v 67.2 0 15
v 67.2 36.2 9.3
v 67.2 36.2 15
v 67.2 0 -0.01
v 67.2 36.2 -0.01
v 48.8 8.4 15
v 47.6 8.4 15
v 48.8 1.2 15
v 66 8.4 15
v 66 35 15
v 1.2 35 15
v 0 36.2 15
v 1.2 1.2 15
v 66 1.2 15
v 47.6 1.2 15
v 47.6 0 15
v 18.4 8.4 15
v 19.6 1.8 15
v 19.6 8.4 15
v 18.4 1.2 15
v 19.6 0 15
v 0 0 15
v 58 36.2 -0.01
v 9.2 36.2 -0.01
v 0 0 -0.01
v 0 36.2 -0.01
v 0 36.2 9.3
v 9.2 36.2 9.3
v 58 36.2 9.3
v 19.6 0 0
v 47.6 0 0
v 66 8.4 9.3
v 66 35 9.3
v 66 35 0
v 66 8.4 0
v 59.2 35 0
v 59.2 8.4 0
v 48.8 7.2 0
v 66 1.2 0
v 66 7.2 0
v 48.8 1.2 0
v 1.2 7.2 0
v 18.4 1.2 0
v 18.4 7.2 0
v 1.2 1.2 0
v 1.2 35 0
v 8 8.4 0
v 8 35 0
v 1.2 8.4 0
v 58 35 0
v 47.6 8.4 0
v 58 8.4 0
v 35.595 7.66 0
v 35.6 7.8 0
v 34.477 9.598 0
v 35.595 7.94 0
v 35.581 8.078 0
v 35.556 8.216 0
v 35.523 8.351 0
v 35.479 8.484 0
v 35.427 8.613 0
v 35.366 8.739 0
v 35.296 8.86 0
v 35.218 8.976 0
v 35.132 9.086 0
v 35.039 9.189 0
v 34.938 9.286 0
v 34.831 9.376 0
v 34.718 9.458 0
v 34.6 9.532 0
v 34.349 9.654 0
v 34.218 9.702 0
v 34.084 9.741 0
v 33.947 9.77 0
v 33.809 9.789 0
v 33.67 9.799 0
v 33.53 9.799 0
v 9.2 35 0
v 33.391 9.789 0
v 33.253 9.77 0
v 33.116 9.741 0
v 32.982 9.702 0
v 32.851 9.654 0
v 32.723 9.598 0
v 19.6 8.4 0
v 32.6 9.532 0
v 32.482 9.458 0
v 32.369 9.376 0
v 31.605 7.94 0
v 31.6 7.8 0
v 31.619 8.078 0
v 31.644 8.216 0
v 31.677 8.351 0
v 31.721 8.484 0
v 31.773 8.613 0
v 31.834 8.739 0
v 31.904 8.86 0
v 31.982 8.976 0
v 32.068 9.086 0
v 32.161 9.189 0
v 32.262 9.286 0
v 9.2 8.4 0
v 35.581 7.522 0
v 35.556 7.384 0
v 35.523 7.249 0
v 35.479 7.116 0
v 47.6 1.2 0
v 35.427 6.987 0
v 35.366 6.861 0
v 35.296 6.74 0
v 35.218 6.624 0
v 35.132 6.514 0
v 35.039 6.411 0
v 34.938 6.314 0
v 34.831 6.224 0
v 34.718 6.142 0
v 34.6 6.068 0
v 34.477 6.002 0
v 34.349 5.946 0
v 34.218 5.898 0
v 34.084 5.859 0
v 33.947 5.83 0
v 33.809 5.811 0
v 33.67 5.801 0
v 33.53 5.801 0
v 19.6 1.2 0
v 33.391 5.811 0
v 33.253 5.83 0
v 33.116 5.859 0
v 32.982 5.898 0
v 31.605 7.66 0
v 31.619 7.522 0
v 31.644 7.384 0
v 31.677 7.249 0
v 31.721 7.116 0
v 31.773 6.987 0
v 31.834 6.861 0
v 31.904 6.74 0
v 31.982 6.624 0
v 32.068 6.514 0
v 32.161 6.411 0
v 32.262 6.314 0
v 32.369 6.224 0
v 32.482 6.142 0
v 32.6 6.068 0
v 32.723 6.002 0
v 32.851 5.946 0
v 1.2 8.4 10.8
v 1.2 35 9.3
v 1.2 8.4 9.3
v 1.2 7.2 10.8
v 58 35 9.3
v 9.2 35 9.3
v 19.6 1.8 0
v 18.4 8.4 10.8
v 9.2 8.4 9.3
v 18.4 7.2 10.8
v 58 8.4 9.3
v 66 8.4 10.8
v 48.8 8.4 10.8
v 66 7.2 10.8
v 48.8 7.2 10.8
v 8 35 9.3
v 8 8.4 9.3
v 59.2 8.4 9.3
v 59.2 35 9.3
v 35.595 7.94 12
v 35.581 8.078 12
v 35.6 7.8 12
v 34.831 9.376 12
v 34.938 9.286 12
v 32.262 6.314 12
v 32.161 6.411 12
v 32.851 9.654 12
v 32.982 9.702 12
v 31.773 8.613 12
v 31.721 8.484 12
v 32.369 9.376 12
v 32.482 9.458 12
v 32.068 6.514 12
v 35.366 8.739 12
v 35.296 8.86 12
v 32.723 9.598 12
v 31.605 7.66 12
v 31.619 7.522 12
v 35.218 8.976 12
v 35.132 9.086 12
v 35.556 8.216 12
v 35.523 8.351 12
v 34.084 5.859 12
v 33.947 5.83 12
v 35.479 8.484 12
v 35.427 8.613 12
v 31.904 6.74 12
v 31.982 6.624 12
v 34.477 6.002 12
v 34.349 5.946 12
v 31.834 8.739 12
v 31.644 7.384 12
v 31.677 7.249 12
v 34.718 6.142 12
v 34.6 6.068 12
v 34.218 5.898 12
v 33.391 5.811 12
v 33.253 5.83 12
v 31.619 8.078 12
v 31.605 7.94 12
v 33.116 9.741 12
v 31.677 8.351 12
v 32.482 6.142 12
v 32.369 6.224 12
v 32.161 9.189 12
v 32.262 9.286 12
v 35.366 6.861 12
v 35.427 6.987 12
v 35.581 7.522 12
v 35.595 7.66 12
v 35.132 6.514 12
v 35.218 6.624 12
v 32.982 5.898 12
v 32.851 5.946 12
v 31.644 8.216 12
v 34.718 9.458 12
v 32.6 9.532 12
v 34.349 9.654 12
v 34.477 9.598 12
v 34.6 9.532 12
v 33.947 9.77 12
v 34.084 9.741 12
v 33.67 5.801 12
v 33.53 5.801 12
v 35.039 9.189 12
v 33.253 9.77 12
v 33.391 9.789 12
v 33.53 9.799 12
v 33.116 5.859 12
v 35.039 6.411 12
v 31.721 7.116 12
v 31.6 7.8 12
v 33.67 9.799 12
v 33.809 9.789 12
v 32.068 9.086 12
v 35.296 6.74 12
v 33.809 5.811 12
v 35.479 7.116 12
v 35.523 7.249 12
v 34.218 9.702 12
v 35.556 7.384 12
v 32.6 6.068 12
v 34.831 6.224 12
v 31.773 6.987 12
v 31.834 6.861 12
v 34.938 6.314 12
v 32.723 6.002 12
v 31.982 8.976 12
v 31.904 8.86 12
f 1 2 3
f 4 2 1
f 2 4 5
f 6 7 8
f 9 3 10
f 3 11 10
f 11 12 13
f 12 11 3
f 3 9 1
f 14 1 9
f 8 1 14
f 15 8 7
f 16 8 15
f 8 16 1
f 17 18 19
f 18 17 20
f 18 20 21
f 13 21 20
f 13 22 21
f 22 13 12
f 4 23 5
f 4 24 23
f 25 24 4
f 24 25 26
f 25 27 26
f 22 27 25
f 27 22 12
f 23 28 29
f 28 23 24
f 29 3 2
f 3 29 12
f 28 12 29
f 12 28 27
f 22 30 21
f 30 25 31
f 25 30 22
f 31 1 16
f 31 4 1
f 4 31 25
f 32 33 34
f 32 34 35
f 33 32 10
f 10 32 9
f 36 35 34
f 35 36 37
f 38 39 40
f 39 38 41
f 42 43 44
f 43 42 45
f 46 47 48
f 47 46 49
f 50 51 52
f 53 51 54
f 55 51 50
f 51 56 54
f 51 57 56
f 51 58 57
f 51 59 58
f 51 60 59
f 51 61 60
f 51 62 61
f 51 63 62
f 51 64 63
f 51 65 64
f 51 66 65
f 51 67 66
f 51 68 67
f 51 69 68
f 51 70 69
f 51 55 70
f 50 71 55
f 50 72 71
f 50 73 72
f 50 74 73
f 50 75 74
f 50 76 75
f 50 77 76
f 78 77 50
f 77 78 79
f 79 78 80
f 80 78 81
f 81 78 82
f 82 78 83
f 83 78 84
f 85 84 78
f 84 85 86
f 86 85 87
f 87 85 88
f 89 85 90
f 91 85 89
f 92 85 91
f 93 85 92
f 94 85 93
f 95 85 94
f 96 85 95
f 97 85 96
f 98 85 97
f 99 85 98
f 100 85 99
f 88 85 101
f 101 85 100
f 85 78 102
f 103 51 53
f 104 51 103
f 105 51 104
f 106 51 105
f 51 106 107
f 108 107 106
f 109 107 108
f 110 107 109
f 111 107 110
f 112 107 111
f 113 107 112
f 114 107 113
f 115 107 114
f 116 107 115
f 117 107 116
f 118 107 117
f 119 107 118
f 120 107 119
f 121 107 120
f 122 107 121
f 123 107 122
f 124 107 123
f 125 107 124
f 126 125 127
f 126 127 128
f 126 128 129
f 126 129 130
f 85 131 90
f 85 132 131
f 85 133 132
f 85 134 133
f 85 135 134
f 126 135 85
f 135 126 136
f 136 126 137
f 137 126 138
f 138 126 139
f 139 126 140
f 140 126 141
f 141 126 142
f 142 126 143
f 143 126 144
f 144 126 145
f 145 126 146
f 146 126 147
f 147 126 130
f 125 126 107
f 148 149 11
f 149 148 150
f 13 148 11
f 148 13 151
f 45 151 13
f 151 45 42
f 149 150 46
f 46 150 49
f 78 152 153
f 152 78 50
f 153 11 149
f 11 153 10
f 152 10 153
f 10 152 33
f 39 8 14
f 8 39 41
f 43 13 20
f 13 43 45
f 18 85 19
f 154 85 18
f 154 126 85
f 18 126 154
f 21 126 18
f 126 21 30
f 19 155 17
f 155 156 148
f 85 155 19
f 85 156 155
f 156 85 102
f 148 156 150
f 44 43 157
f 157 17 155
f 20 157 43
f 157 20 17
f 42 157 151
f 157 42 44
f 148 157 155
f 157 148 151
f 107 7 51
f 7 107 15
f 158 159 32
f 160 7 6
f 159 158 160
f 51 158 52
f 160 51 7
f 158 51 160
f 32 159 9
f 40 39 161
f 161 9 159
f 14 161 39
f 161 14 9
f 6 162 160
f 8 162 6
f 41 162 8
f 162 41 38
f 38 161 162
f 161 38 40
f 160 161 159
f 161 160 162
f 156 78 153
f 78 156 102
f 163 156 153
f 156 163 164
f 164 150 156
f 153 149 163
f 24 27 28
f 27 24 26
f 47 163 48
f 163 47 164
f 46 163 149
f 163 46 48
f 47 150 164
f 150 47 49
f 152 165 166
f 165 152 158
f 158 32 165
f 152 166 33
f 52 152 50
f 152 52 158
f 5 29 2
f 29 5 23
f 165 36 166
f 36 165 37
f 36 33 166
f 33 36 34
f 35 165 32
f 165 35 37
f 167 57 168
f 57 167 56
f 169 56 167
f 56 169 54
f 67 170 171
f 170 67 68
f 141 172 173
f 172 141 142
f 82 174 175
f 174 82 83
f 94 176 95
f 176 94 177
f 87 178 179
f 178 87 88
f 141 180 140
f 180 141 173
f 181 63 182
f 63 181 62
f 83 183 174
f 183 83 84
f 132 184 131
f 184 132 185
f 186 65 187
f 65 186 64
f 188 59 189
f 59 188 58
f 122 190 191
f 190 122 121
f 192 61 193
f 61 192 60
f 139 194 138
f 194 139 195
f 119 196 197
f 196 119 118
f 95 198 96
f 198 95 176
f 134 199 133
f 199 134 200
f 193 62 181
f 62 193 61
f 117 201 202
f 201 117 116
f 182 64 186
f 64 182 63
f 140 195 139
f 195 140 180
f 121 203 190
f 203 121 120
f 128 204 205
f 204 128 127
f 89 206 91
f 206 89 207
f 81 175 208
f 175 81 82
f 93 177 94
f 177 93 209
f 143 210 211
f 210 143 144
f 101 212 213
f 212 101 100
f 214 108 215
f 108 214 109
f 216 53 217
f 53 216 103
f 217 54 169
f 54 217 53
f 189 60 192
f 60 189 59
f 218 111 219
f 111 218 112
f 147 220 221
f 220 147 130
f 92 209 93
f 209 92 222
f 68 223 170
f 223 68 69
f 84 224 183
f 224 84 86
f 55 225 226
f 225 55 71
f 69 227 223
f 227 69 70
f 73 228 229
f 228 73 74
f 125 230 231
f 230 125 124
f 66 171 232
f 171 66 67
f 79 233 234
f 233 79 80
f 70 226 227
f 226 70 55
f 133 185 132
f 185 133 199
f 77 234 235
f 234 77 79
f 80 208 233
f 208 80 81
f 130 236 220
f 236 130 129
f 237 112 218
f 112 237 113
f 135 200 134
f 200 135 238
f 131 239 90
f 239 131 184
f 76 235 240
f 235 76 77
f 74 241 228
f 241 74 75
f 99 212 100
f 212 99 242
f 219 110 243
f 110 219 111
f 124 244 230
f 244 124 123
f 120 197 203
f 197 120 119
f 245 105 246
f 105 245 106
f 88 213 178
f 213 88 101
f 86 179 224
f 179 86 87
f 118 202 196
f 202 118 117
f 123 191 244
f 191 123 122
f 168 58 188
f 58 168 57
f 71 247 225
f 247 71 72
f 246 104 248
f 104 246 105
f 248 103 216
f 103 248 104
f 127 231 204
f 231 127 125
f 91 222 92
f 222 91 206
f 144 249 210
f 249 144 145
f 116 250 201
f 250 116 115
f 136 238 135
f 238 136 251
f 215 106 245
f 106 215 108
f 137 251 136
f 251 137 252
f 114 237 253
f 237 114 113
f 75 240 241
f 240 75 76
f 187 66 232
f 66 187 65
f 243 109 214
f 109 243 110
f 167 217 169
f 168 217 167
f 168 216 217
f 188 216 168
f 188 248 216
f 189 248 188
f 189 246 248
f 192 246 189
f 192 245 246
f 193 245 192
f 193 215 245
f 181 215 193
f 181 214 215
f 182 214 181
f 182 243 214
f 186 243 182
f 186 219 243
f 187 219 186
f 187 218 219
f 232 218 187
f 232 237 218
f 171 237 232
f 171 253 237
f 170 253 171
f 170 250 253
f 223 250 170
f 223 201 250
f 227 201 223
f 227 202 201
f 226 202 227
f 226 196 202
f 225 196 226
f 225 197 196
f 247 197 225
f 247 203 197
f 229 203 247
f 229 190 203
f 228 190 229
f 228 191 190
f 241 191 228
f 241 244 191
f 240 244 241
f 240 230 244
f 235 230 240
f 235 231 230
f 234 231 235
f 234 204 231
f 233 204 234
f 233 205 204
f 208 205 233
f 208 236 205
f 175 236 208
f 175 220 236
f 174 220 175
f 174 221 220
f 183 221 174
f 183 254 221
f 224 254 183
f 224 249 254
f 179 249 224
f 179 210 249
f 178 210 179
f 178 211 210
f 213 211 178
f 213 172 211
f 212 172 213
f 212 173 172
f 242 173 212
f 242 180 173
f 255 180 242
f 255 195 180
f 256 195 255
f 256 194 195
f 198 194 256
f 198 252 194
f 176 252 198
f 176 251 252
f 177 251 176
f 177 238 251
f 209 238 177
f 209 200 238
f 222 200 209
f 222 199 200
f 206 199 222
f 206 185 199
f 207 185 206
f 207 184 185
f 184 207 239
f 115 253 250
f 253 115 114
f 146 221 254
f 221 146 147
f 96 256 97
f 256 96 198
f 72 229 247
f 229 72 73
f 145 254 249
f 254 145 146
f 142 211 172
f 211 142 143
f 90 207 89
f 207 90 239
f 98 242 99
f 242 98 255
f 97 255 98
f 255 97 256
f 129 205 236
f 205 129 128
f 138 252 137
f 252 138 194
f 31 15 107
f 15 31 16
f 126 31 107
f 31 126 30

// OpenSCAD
// file: ../Base/Boxes.scad
// Fischertechnik Box Foundation
// Pre-designed Boxes

use <Constants.scad>

include <PlacementOptions.scad>

box190Width = 190;
box190Depth = 130;
box130Width = 130;
box130Depth = 95;
boxUsageHeight = 33.9;
boxWallThickness = 2.4;
boxBaseThickness = 1.0;

// getBoxWallThickness()
// Gets the wall thickness of a Fischertechnik Box

function getBoxWallThickness() = boxWallThickness;

// Gets the usable height of a fischertechnik box
function getBoxUsageHeight() = boxUsageHeight;

// Gets the thickness of the Fischertechnik box base.
function getBoxBaseThickness() = boxBaseThickness;

// Gets the usable inner space of a Box 190 as an x/y-list
function getBox190Space() = [
    box190Width - 2*getBoxWallThickness(), 
    box190Depth - 2*getBoxWallThickness() ];

// Imports the Fischertechnik empty box 130x190 mm and places it at position 0,0
// 190x130 are the outer sizes, the inner space is slightly smaller. Use getBox190Space() to get the inner sizes.
// This module needs the STL file "Fischertechnik Box 130x190.stl" in the library path.
// The box is positioned that the usable inner space is at the 0,0,0 position. The

module Box190() {
    translate([-getBoxWallThickness(),-getBoxWallThickness(),-getBoxBaseThickness()])
        import("Fischertechnik Box 130x190.stl", convexity=3);
}

// Gets the usable inner space of a Box 130 as an x/y-list
function getBox130Space() = [
    box130Width - 2*getBoxWallThickness(), 
    box130Depth - 2*getBoxWallThickness() ];

// Imports the Fischertechnik empty box 95x130 mm and places it at position 0,0
// 190x130 are the outer sizes, the inner space is slightly smaller. Use getBox190Space() to get the inner sizes.
// This module needs the STL file "Fischertechnik Box 95x130.stl" in the library path.
// The box is positioned that the usable inner space is at the 0,0,0 position. The

module Box130() {
    translate([-getBoxWallThickness(),-getBoxWallThickness(),-getBoxBaseThickness()])
        import("Fischertechnik Box 95x130.stl", convexity=3);
}

// Creates a web at the specified box walls
// corner 0 = LowerLeft, 1 = UpperLeft, 2 = UpperRight, 3 = LowerRight
// side 0 = LeftOfCorner, 1 = RightOfCorner
// distance = Distance in mm from the corner
// box = inner width and depth of the box (default: Box 190)
// webWidth = length of the web (default is 3 mms)
// webThickness = thickness of the web (default is 1 mm)

module BoxWeb(corner, side, distance, box=getBox190Space(), webWidth=3, webThickness=1.0) {
    sink = getBoxWallThickness()/2;

    width = (corner % 2 == 0) ? 
            (side == LeftOfCorner ? webWidth : webThickness) :
            (side == LeftOfCorner ? webThickness : webWidth);

    depth = (corner % 2 == 0) ? 
            (side == RightOfCorner ? webWidth : webThickness) :
            (side == RightOfCorner ? webThickness : webWidth);
    
    xDiff = corner == LowerLeft ? 
                (side == LeftOfCorner ? -sink : distance) :
            (corner == UpperLeft ?                
                (side == LeftOfCorner ? distance : -sink) :
            (corner == UpperRight ?
                (side == LeftOfCorner ? box.x-webWidth+sink : box.x-distance-webThickness) :
                (side == LeftOfCorner ? box.x-distance-webThickness: box.x-webWidth+sink)));

    yDiff = corner == LowerLeft ? 
                (side == RightOfCorner ? -sink : distance) :
            (corner == UpperLeft ?
                (side == RightOfCorner ? box.y-distance : box.y-webWidth+sink) :
            (corner == UpperRight ?
                (side == RightOfCorner ? box.y-webWidth+sink : box.y-distance) :
                (side == RightOfCorner ? distance : -sink)));
    
    translate([xDiff, yDiff, -getExcess()])
        cube([width, depth, boxUsageHeight + 2*getExcess()]);
}
// file: ../Base/Rotation.scad
// Fischertechnik Box Foundation
// Geometry Helpers Rotation

include <PlacementOptions.scad>

// getRotatedSpace(space, rotation=NoRotation)
// Rotates the space dependent on the specified rotation

function getRotatedSpace(space, rotation=NoRotation) = [
    (rotation == Rotate90 || rotation == Rotate270) ? space.y : space.x,
    (rotation == Rotate90 || rotation == Rotate270) ? space.x : space.y
];

// Rotates the given space around the fixed left lower corner
// space = the space the children needs as width/depth list [width,depth]
// rotation = 0 Rotate0 degrees, 1 Rotate90 degrees, 2 Rotate180 degrees, 3 Rotate270 degrees (equivalent to -90)

module RotateFix(space, rotation=Rotate0) {
    dy = (rotation == Rotate0 || rotation == Rotate270) ? 0 :
        (rotation == Rotate90) ? space.x :
        space.y;
    dx = (rotation < Rotate180) ? 0 :
        (rotation == Rotate180) ? space.x :
        space.y;
    
    translate([dx, dy, 0])
        rotate([0, 0, rotations[rotation]])
            children();
}
// file: ../Base/Alignment.scad
// Fischertechnik Box Foundation
// Geometry Helpers Alignment

include <PlacementOptions.scad>

// getAlignedX(elementWidth, spaceWidth, align=AlignRight, offset=0)
// Gets the aligned X offset of an element with the given
// width in the given space.
// elementWidth = The width of the element to positon
// spaceWidth = The space where the element should be aligned
// align = 0 AlignLeft, 1 AlignCenter, 2 AlignRight
// offset = an optional offset from the aligned position. When
// aligned left or centered, then positive values are in X direction.
// When aligned right then positive values are in negative X direction.

function getAlignedX(elementWidth, spaceWidth, align=AlignRight, offset=0) =
    (align == AlignLeft) ?
        offset :
        ((align == AlignCenter) ?
        (spaceWidth - elementWidth)/2 + offset :
        spaceWidth - offset - elementWidth);

// getAlignedY(elementDepth, spaceDepth, align=AlignTop, offset=0)
// Gets the aligned Y offset of an element with the given
// depth in the given space.
// elementDepth = The depth of the element to positon
// spaceDepth = The space where the element should be aligned
// align = 0 AlignBottom, 1 AlignCenter, 2 AlignTop
// offset = an optional offset from the aligned position. When
// aligned bottom or centered, then positive values are in Y direction.
// When aligned top then positive values are in negative Y direction.

function getAlignedY(elementDepth, spaceDepth, align=AlignTop, offset=0) =
    (align == AlignBottom) ?
        offset :
        ((align == AlignCenter) ?
        (spaceDepth - elementDepth)/2 + offset :
        spaceDepth - offset - elementDepth);
// file: ../Base/PlacementOptions.scad
// Fischertechnik Box Foundation
// Placement Options

// Alignment
NoAlign = 0;
AlignLeft = 1;
AlignBottom = 2;
AlignCenter = 3;
AlignRight = 4;
AlignTop = 5;

// Element rotation degree steps
rotations = [0, -90, -180, -270];

// Rotation
NoRotation = 0;
Rotate0 = 0;
Rotate90 = 1;
Rotate180 = 2;
Rotate270 = 3;

// Docking (seen from above)
NoDock = -1;
DockLeft = 0;
DockTop = 1;
DockRight = 2;
DockCorner = 2;
DockBottom = 3;

// Web corners
LowerLeft = 0;
UpperLeft = 1;
UpperRight = 2;
LowerRight = 3;

// Web position relative to corner
LeftOfCorner = 0;
RightOfCorner = 1;
// file: ../Base/Placement.scad
// Fischertechnik Box Foundation
// Geometry Helpers Placement

use <Constants.scad>
use <Alignment.scad>
use <Rotation.scad>
use <Boxes.scad>

include <PlacementOptions.scad>

// Place(x=0, y=0, elementSpace=[0,0], alignX=AlignLeft, alignY=AlignBottom, rotation=Rotate0, boxSpace=getBox190Space())
// Places the child at the specified position
// y = Y-Position. This is a relative position when an X aligment is specified.
// x = X-Position. This is a relative position when an Y aligment is specified.
// elementSpace = space of the element to be placed [x,y]
// alignX = -1=NoAlign, 0 AlignLeft, 1 AlignCenter, 3 AlignRight (elementSpace and boxSpace required!)
// alignY = -1=NoAlign, 2 AlignBottom, 1 AlignCenter, 4 AlignTop (elementSpace and boxSpace required!)
// rotation = 0 Rotate0 0 degrees, 1 Rotate90 90 degrees, 
// 2 Rotate180 180 degrees, 3 Rotate270 270 degrees (equivalent to -90)
// boxSpace = Inner space of the box where the placement occurs [x,y] - default is Box 190x130 inner space

module Place(x=0, y=0, elementSpace=[0,0], 
  alignX=AlignLeft, alignY=AlignBottom, 
  rotation=NoRotation, boxSpace=getBox190Space()) {

    module Position(x, y, space, rotation=Rotate0) {
        translate([x, y, 0])
            RotateFix(space, rotation)
                children(0);
    }

    space = getRotatedSpace(elementSpace, rotation);
    alignedX = getAlignedX(space.x, boxSpace.x, alignX, x);
    alignedY = getAlignedY(space.y, boxSpace.y, alignY, y);
    Position(alignedX, alignedY, elementSpace, rotation)
        children(0);
}

// Center(space=getBox130Space(), elementSpace=[0,0])
// space = Space where the children is centered. For cylinder use centered=true and no elementSpace.
// elementSpace = space of the element to be centered [x,y]

module Center(space=getBox190Space(), elementSpace=[0,0]) {
    translate([(space.x - elementSpace.x) / 2, (space.y - elementSpace.y) / 2])
        children(0);
}

// CenterHorizontal(width=0, y=0, offset=0, space=getBox130Space())
// space = Space where the children is centered. For cylinder use centered=true and no elementSpace.
// elementSpace = space of the element to be centered [x,y]

module CenterHorizontal(width=0, y=0, offset=0, space=getBox190Space()) {
    translate([(space.x - width) / 2 + offset, y])
        children(0);
}

// CenterVertical(depth=0, x=0, offset=0, space=getBox130Space())
// space = Space where the children is centered. For cylinder use centered=true and no elementSpace.
// elementSpace = space of the element to be centered [x,y]

module CenterVerticalal(depth=0, x=0, offset=0, space=getBox190Space()) {
    translate([x, (space.y - depth) / 2 + offset])
        children(0);
}
// file: ../Base/Constants.scad
// Fischertechnik Box Foundation
// Constants

// Constant values necessary for multiple elements

// Base constants
dividerThickness = 1.2;
excess = 0.01;
fragments = 90;
tolerance = 0.8;

// Gets the thickness of a divider 
function getDividerThickness() = dividerThickness;

// Gets the excess that is used to merge walls into each other
function getExcess() = excess;

// Gets amount of fragments of a cylinder
function getFragments() = fragments;

// Gets the inner tolerance of a frame to each side
function getTolerance() = tolerance;


// Fischertechnik specific constants
axisDiameter = 4;
axisBottomDiameter = axisDiameter + 1;
standardEdgeDistance = 2.5;
standardWebDistance = 11.5;
standardCornerLength = 15;
tubeWallFactor = 1.6;

// Gets axis diameter
function getAxisDiameter() = axisDiameter;

// Gets axis bottom diameter for thicker part at the bottom
function getAxisBottomDiameter() = axisBottomDiameter;

// gets the standard distance to the wall of the box for dockable frames with webs
function getStandardEdgeDistance() = standardEdgeDistance;

// gets the standard distance of each web to the corner of the dockable frame
function getStandardWebDistance() = standardWebDistance;

// gets the standard length of the corner walls of a dockable frame
function getStandardCornerLength() = standardCornerLength;

// gets the wall thickness of a tube.
function getTubeWallThickness() = tubeWallFactor * getDividerThickness();
// main file
// Fischertechnik Box Library
// Toothed Tile Bar with Control Links
// 38472, 2x38473

use <../Base/Constants.scad>
use <../Base/Placement.scad>
use <../ModelBase/Simple.scad>

include <../Base/PlacementOptions.scad> 

width = 64;
depth = 33;
height = 15;

// getFrameToothedTileBarWithControlLinksSpace
// Gets the space the toothed tile bar with control links needs as width and depth (.x and .y as a list)

function getFrameToothedTileBarWithControlLinksSpace() = getFrameOuterVolume([width, depth, height]);

// FrameToothedTileBarWithControlLinks()
// rame for toothed tile bar with two control links
// 38472, 2x38473

module FrameToothedTileBarWithControlLinks() {    
    sideHeight = 9.3;
    endHeight = 10.8;
    innerFrameDistance = 6;
    axisHeight = 12;
    cutoffWidth = 28;

    outerSpace = getFrameToothedTileBarWithControlLinksSpace();
    endWidth = (outerSpace.x - cutoffWidth) / 2 - 2 * getDividerThickness();
    endDepth = innerFrameDistance;

    module EndPiece() {
        difference() {
            Frame ([endWidth, endDepth, height], 0);
            translate([getDividerThickness(), endDepth+getDividerThickness()/2, endHeight])
                cube([endWidth, 2*getDividerThickness(), height - endHeight + getExcess()]);
        }
    }
    
    module AllFrames() {
        Frame ([width, depth, height]);
        innerVolume = getFrameInnerVolume([width, depth, height]);
        
        endSpace = getFrameOuterVolume([endWidth, endDepth, endHeight], 0);

        EndPiece();
        Place(elementSpace=endSpace, alignX=AlignRight, boxSpace=outerSpace)
            EndPiece();
        
        sideWidth = innerFrameDistance;
        sideDepth = depth - endDepth - getDividerThickness();
        sideYOffset = endDepth + getDividerThickness();
        
        translate ([0, sideYOffset, 0])
            Frame ([sideWidth, sideDepth, sideHeight]);
        sideXOffset = width - innerFrameDistance;
        translate ([sideXOffset, sideYOffset, 0])
            Frame ([sideWidth, sideDepth, sideHeight]);            
            
        translate([innerVolume.x/2 + getDividerThickness(), innerFrameDistance + getDividerThickness()*1.5])
            Axis(axisHeight);
    }
    
    cutOffXOffset = (getFrameToothedTileBarWithControlLinksSpace().x - cutoffWidth) / 2;
    
    difference() {
        AllFrames();
        Center([getFrameToothedTileBarWithControlLinksSpace().x, getDividerThickness()], [cutoffWidth, 2*getDividerThickness()])
            cube([cutoffWidth, 2*getDividerThickness(), height+1]);
    }
}

// Test
color("lightgray")
FrameToothedTileBarWithControlLinks();
